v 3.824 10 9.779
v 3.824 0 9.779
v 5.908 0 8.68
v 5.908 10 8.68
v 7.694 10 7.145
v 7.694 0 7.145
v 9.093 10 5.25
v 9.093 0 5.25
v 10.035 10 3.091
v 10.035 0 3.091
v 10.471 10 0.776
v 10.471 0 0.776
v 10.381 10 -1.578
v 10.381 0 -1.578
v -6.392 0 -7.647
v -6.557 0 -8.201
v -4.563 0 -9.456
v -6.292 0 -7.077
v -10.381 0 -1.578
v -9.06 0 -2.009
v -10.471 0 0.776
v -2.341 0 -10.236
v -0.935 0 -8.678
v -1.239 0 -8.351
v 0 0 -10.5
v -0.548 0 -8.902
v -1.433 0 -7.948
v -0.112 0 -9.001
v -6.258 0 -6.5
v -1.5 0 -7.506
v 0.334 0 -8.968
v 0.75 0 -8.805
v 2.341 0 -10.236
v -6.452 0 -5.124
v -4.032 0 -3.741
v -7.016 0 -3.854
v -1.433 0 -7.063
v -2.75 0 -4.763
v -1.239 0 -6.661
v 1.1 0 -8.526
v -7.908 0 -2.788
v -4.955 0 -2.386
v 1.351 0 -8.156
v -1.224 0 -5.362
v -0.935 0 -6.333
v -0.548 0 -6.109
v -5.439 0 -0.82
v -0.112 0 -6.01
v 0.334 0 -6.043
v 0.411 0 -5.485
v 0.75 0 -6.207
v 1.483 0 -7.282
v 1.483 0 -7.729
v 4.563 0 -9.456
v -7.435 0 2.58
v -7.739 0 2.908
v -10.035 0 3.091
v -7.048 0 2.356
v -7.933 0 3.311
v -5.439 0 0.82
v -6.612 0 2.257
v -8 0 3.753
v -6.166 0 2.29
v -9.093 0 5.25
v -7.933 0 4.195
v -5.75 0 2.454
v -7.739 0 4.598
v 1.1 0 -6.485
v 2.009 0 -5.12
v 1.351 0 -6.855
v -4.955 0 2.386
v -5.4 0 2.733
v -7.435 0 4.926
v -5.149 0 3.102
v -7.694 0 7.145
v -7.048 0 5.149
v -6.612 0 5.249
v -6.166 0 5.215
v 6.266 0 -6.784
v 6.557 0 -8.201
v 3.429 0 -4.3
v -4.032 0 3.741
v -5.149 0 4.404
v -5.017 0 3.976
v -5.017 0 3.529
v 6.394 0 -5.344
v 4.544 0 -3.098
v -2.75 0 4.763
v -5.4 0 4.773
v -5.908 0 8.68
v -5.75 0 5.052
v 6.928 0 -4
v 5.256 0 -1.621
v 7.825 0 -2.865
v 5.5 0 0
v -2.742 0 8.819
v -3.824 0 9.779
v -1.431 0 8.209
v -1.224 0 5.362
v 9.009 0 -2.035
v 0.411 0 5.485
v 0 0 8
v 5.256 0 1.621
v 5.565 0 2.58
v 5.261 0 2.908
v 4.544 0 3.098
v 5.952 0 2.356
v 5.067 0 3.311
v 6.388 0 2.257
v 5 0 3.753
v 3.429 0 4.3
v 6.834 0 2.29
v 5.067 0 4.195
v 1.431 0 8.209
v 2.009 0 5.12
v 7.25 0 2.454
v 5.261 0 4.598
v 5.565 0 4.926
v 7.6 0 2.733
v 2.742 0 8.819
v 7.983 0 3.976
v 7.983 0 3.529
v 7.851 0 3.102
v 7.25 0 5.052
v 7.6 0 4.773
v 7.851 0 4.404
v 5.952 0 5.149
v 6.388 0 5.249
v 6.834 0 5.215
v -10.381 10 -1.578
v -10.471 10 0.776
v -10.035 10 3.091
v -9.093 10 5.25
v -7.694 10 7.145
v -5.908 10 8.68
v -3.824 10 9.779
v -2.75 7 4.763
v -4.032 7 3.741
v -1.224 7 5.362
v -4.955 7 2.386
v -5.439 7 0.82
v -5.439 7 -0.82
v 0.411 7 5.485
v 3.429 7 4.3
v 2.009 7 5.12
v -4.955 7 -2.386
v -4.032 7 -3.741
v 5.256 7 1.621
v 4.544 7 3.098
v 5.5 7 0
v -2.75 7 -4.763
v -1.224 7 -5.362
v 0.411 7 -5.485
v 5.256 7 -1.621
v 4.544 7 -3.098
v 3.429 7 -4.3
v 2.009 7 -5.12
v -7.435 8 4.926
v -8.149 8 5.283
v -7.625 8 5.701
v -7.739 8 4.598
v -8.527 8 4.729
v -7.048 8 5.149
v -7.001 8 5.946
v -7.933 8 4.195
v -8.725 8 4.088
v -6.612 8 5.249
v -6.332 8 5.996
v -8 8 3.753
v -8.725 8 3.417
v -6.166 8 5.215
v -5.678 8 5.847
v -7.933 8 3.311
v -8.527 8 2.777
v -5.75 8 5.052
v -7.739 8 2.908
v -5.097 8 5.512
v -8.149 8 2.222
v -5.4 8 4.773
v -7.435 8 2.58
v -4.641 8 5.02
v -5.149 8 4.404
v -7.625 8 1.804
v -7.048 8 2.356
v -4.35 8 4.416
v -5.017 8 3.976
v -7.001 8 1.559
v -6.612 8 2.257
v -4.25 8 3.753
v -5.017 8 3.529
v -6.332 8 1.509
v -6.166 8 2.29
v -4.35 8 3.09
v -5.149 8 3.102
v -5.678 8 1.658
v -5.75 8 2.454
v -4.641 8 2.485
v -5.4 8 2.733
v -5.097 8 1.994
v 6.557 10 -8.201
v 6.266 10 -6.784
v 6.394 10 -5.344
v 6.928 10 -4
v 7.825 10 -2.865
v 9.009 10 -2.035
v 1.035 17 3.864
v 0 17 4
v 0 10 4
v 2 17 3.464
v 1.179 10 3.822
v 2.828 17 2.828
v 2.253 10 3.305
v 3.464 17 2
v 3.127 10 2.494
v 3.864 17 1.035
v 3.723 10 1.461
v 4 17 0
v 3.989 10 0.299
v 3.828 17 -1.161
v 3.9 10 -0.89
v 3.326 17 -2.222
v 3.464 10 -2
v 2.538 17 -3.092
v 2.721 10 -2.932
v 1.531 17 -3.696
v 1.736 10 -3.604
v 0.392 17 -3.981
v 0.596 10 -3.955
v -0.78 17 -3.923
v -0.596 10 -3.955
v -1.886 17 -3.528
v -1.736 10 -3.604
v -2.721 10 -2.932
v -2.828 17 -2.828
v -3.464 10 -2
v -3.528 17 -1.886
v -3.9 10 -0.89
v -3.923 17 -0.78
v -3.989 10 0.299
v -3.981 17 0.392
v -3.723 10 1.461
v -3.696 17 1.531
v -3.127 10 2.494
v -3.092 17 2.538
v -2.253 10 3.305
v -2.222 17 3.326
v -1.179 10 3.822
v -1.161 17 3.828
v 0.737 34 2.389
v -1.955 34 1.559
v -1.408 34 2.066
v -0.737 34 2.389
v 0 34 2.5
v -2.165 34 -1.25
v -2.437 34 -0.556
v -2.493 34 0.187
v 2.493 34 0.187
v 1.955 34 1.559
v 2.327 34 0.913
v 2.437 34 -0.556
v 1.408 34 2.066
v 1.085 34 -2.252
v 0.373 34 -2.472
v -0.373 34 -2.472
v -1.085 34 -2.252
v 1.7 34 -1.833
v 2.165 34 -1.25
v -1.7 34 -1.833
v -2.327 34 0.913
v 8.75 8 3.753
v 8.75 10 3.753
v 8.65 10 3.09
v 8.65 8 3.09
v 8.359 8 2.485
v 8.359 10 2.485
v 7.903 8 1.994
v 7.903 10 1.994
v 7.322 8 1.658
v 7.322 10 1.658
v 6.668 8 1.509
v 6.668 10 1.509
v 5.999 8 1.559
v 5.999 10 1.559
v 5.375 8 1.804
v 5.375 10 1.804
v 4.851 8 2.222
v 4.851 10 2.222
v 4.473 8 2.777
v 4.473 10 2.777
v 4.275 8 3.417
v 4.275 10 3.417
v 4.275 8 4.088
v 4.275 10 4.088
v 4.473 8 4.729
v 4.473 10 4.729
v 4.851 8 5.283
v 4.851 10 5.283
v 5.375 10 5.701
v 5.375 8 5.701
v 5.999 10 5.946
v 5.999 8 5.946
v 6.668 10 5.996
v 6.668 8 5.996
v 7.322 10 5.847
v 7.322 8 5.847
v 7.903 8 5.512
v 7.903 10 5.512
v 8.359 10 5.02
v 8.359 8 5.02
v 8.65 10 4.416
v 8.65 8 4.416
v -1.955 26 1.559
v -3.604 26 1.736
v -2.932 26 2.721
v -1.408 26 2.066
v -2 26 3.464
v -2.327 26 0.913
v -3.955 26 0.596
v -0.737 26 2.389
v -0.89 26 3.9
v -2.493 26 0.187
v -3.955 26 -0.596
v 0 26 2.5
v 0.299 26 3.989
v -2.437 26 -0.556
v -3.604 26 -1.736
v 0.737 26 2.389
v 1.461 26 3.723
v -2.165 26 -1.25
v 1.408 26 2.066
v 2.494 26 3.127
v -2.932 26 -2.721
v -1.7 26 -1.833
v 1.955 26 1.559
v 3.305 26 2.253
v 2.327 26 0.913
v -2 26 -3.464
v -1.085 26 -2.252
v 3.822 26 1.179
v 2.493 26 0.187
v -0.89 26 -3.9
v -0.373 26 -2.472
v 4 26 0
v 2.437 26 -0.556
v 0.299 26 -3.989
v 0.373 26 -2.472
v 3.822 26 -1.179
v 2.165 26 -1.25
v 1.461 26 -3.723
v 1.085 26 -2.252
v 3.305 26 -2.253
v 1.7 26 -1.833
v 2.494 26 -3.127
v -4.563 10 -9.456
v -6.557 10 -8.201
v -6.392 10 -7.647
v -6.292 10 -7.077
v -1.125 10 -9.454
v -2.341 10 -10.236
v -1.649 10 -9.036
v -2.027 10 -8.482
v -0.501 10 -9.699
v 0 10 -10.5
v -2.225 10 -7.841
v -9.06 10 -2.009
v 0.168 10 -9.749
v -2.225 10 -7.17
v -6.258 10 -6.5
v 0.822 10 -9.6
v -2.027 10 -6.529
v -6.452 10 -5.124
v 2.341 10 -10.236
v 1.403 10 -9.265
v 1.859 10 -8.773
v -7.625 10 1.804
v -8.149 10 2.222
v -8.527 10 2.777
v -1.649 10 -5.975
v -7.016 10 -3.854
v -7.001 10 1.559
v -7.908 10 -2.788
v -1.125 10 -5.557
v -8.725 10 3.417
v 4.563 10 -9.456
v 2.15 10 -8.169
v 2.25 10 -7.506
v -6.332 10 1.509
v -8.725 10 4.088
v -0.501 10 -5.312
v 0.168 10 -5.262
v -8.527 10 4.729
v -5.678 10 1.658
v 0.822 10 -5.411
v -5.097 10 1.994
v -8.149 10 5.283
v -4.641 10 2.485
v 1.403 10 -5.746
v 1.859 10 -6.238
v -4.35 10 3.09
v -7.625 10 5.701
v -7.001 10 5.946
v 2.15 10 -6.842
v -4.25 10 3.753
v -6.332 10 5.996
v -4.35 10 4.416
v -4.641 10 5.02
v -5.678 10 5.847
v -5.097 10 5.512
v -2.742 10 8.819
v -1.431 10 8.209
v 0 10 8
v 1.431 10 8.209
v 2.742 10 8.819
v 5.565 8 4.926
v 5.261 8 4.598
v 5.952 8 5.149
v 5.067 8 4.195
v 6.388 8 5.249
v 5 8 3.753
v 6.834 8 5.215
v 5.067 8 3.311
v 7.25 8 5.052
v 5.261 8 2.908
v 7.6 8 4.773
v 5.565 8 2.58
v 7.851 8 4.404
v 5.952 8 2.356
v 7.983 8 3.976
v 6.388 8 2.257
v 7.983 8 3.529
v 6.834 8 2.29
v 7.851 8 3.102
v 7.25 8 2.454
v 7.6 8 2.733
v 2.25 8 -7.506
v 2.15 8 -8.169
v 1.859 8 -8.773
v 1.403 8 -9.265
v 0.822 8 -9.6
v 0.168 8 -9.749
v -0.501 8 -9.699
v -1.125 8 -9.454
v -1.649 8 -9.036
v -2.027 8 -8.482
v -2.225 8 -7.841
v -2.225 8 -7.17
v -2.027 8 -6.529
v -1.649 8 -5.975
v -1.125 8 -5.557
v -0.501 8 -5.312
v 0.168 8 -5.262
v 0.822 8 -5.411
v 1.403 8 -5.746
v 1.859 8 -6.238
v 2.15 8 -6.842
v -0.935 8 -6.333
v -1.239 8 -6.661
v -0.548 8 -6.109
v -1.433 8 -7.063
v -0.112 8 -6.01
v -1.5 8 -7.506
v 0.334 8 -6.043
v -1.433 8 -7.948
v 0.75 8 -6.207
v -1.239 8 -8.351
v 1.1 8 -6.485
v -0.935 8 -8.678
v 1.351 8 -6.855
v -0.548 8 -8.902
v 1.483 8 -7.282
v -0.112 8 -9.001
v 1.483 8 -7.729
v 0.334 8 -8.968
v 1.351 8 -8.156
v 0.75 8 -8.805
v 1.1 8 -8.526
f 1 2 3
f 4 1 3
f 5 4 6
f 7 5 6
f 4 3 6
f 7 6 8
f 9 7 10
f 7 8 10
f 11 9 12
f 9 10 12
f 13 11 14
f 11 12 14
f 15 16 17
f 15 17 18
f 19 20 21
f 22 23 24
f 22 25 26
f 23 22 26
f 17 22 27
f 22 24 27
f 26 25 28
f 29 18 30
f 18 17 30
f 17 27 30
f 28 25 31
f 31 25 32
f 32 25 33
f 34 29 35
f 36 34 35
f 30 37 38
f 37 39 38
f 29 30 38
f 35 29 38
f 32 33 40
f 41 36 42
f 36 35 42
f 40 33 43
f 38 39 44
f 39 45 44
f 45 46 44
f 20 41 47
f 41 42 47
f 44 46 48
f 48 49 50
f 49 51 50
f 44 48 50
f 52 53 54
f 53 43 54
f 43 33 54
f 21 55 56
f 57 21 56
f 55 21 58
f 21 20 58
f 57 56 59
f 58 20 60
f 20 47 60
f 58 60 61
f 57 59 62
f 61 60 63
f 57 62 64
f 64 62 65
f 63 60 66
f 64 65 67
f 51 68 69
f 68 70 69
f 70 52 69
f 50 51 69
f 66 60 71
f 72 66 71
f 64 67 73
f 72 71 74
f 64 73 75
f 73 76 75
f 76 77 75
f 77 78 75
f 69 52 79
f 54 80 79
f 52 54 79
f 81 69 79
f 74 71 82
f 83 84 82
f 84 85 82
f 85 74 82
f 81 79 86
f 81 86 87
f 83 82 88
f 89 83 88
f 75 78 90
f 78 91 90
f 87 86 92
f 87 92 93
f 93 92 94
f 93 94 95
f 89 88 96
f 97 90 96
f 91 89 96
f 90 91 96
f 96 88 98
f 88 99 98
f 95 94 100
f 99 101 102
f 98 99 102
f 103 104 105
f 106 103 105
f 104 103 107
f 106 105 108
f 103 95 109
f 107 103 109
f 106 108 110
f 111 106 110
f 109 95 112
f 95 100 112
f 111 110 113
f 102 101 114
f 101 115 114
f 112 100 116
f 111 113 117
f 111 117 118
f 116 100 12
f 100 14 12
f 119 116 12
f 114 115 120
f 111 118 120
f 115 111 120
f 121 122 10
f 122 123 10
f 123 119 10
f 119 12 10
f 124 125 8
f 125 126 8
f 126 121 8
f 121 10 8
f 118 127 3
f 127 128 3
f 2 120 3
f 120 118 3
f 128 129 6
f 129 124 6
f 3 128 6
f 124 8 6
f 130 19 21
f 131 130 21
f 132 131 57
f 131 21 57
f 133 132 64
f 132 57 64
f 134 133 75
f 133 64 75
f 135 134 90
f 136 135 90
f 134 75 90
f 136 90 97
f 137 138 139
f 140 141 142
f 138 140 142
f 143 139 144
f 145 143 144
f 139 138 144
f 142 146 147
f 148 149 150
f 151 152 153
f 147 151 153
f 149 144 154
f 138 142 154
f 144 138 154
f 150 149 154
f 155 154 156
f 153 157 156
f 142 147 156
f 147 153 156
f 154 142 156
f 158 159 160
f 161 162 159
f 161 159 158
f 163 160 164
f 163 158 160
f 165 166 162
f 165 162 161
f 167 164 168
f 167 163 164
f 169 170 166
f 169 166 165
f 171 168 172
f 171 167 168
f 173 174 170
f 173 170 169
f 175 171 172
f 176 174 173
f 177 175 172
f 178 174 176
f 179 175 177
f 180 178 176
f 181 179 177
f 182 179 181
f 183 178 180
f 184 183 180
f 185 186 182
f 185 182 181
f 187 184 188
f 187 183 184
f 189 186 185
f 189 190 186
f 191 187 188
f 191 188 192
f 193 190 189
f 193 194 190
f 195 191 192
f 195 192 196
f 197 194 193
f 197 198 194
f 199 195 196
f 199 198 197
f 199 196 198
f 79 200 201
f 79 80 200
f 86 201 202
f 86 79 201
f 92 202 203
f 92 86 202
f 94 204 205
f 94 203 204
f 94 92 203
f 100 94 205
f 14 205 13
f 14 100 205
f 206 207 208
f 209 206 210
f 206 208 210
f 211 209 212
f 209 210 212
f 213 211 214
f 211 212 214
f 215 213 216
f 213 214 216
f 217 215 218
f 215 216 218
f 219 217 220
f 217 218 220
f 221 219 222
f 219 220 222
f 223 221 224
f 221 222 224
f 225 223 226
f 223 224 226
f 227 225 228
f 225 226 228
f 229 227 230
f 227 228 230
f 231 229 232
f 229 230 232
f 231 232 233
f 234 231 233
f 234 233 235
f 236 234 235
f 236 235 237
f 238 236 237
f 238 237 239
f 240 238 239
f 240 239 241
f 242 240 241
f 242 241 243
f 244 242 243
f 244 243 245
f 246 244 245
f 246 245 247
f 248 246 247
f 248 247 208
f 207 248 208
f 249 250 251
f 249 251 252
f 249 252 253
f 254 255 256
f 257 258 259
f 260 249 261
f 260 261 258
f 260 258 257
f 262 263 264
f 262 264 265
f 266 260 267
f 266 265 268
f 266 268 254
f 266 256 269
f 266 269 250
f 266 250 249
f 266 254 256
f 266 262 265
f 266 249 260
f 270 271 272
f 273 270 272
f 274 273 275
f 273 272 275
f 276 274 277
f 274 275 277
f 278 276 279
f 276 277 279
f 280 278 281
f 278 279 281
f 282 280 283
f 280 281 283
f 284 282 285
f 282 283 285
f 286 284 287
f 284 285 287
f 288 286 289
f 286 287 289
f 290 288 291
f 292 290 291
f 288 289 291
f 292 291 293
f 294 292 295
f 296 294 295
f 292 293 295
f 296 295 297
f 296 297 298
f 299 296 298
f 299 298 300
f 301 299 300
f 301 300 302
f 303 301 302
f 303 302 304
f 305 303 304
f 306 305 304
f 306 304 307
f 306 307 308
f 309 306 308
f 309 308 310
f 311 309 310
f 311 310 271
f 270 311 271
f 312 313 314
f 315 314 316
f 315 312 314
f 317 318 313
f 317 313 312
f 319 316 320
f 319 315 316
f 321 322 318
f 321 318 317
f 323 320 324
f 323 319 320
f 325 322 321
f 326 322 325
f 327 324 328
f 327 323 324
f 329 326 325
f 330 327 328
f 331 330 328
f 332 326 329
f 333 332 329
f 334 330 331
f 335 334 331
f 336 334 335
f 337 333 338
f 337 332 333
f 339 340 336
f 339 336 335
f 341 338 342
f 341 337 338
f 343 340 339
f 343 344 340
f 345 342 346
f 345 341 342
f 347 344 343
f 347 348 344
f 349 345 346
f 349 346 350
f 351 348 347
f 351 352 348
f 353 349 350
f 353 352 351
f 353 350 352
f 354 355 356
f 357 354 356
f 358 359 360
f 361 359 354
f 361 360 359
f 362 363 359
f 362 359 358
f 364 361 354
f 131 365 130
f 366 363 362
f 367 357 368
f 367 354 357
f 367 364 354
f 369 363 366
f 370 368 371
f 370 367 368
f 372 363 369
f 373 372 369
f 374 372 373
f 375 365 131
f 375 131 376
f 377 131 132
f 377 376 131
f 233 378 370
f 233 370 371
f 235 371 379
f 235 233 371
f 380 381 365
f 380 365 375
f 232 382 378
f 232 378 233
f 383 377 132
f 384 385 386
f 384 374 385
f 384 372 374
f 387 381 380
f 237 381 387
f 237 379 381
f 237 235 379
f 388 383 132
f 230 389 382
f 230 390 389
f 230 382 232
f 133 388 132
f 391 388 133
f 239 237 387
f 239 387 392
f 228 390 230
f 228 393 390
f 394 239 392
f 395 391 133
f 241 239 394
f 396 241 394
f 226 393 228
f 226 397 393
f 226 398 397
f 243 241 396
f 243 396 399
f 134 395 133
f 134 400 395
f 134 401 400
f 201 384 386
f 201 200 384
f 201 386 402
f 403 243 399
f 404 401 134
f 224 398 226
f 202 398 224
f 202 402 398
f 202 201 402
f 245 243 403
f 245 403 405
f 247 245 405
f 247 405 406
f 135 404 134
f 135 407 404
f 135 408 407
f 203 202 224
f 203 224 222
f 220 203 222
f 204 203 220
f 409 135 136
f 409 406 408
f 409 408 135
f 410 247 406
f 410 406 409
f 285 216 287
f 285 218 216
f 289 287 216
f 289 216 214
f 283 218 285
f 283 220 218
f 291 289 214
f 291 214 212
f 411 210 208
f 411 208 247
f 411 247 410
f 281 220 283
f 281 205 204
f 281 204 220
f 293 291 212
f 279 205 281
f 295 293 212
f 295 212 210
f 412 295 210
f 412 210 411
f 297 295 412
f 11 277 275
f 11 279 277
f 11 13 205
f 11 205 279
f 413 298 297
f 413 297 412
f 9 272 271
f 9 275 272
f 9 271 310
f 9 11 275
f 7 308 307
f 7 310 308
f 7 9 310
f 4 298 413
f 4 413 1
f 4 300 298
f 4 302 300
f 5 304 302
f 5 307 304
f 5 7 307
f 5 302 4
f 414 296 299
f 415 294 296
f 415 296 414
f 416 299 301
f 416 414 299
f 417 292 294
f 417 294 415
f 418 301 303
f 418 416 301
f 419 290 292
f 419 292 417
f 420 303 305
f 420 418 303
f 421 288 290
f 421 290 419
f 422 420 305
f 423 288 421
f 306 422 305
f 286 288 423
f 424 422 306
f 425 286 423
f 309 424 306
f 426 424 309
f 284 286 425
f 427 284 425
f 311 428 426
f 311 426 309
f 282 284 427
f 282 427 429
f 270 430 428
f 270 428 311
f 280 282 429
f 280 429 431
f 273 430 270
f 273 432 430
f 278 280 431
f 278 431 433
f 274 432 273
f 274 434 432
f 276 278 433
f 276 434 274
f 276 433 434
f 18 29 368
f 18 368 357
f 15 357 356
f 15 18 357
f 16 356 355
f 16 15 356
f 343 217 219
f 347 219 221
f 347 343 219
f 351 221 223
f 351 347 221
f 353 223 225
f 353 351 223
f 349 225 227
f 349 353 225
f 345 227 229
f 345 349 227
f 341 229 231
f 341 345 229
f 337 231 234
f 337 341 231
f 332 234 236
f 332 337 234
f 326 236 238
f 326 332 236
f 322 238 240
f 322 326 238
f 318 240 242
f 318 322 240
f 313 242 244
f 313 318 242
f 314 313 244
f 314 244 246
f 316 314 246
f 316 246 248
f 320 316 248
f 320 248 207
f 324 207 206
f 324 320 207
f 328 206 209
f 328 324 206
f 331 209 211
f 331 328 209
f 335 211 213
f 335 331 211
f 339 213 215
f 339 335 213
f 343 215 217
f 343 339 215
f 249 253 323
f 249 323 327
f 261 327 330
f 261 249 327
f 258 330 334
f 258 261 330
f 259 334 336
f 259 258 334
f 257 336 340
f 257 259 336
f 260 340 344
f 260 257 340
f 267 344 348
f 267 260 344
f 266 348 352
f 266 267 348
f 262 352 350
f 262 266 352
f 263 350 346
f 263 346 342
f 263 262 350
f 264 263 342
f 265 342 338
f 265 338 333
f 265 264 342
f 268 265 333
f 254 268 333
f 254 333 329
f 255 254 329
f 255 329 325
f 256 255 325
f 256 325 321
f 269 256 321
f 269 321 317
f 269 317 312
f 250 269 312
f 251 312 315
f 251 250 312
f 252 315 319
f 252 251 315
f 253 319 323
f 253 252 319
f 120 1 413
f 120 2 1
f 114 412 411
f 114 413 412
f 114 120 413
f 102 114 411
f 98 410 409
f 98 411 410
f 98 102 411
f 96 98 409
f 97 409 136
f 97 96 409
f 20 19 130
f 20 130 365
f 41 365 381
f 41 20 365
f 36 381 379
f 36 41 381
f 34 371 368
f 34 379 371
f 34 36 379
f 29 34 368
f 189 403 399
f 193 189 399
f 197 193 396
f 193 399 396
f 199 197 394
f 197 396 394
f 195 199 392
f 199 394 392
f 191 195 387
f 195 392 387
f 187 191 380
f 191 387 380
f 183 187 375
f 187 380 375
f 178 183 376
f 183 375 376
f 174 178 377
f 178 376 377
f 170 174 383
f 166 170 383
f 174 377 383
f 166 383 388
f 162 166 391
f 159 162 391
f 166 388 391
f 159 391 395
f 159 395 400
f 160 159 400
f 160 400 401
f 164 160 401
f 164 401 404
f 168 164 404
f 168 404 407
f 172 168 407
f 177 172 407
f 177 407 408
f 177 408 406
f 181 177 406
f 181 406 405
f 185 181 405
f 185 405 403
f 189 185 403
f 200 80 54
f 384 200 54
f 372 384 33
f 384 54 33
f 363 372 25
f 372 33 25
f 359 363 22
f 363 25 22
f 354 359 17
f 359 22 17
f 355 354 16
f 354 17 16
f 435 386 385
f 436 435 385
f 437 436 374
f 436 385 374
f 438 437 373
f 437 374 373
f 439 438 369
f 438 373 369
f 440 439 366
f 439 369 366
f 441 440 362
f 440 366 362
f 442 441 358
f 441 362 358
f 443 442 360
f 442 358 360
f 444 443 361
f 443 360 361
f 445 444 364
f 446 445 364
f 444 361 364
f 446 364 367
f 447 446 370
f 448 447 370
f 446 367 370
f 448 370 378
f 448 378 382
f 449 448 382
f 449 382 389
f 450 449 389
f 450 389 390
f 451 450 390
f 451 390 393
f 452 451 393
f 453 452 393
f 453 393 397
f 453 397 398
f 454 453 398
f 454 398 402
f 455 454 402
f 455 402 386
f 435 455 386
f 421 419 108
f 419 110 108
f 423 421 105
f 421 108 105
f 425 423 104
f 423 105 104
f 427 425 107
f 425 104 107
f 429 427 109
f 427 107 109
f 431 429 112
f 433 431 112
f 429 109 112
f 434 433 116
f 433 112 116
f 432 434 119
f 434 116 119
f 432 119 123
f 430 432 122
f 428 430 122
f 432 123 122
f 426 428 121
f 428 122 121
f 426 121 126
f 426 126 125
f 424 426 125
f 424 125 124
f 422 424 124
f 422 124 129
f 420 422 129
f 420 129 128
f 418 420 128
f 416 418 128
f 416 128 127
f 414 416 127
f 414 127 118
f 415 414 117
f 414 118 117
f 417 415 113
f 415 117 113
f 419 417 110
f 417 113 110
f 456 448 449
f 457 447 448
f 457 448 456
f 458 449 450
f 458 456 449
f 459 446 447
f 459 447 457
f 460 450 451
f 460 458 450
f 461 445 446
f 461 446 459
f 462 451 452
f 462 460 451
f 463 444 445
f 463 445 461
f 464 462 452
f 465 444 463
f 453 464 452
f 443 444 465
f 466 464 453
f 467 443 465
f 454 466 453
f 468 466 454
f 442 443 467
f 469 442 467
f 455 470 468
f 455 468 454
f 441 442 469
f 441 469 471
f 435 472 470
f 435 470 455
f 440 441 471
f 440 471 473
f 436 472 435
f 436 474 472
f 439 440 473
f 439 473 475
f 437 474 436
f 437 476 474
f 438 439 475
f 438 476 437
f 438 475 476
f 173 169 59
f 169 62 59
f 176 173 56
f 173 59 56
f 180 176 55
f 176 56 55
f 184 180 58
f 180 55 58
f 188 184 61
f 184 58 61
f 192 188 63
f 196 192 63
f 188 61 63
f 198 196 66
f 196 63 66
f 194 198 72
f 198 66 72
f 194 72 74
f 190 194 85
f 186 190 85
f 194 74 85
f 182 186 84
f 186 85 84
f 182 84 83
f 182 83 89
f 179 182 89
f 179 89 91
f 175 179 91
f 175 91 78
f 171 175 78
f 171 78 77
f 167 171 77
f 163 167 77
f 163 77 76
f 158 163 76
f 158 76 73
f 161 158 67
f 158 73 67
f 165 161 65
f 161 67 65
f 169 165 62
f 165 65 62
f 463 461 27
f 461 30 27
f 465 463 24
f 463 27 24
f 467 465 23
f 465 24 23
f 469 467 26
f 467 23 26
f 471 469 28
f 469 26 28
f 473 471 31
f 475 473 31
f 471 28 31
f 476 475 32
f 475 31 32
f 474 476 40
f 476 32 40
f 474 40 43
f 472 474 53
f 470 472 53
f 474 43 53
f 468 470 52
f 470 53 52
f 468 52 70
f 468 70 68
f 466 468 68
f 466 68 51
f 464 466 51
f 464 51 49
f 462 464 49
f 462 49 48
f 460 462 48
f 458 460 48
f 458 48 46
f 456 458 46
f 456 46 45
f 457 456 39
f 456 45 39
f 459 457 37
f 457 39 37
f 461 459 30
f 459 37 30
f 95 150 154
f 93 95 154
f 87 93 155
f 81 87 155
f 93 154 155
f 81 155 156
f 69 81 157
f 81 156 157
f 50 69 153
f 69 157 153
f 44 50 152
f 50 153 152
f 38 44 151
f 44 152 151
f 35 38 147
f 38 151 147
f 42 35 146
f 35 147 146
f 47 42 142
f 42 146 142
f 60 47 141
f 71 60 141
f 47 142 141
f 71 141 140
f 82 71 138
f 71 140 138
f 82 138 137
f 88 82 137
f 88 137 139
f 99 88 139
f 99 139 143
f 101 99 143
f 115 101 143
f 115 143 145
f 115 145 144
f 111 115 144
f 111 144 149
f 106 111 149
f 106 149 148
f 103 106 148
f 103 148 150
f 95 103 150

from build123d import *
from build123d.topology import SkipClean

# Parameters (mm, degrees)
SKETCH1_R               = 10.5
SKETCH1_R_2             = 4
BOSS_EXTRUDE1_DEPTH     = 10
SKETCH1_3_R             = 4
BOSS_EXTRUDE2_DEPTH     = 17
CUT_EXTRUDE3_DEPTH      = 38.101212918
CUT_EXTRUDE3_DEPTH_BACK = 38.101212918
SKETCH4_R               = 5
HOLE1_D                 = 3
HOLE1_DEPTH             = 10
HOLE1_CBORE_D           = 4.5
HOLE1_CBORE_DEPTH       = 2
HOLE1_TIP               = 0.901290929
HOLE2_D                 = 11
HOLE2_DEPTH             = 7
SKETCH10_R              = 8.667878953
SKETCH10_R_2            = 2.5
CUT_EXTRUDE4_DEPTH      = 8


# Read off the part's stored shape, not the designer's step: M8x1.25 Machine Threads Stud1
with BuildPart() as part:
    # Sketch1 → Boss-Extrude1 (new body)
    # profile 1 of 2: a face of its own
    with BuildSketch(Plane(origin=(0, 0, 0), x_dir=(1, 0, 0), z_dir=(0, 1, 0))):
        with Locations(Location((0, 0, 0), (0, 0, 270))):
            Circle(SKETCH1_R)
        Circle(SKETCH1_R_2, mode=Mode.SUBTRACT)
    # profile 2 of 2: a face of its own
    with BuildSketch(Plane(origin=(0, 0, 0), x_dir=(1, 0, 0), z_dir=(0, 1, 0))):
        Circle(SKETCH1_R_2)
    extrude(amount=BOSS_EXTRUDE1_DEPTH)

    # Sketch1<3> → Boss-Extrude2 (add)
    with BuildSketch(Plane(origin=(0, 0, 0), x_dir=(1, 0, 0), z_dir=(0, 1, 0))):
        with Locations(Location((0, 0, 0), (0, 0, 270))):
            Circle(SKETCH1_3_R)
    extrude(amount=BOSS_EXTRUDE2_DEPTH)

    # M8x1.25 Machine Threads Stud1 outline → M8x1.25 Machine Threads Stud1 (revolve)
    with SkipClean():  # the faces are left unmerged after this step: merging them gives an invalid solid
        with BuildSketch(Plane.XY):
            Polygon((4, 17), (4, 33.3095), (3.3095, 34), (0, 34), (0, 17), align=None)
        revolve(axis=Axis((0, 0, 0), (0, 1, 0)))

    # Sketch4 → Cut-Extrude3 (cut, two sides: drawn at the far end of the back side and taken through both)
    with SkipClean():  # the faces are left unmerged after this step: merging them gives an invalid solid
        with BuildSketch(Plane(origin=(0, 0, 0), x_dir=(1, 0, 0), z_dir=(0, 1, 0)).offset(-CUT_EXTRUDE3_DEPTH_BACK)):
            with Locations((0, -13)):
                Circle(SKETCH4_R)
            with Locations((-11.258330249, 6.5)):
                Circle(SKETCH4_R)
            with Locations((11.258330249, 6.5)):
                Circle(SKETCH4_R)
        extrude(amount=CUT_EXTRUDE3_DEPTH + CUT_EXTRUDE3_DEPTH_BACK, mode=Mode.SUBTRACT)

    # Hole1
    with Locations(Plane(origin=(0, 10, 0), x_dir=(1, 0, 0), z_dir=(0, 1, 0))):
        with Locations((0, 7.505553499), (6.5, -3.75277675), (-6.5, -3.75277675)):
            CounterBoreHole(HOLE1_D / 2, HOLE1_CBORE_D / 2, HOLE1_CBORE_DEPTH, depth=HOLE1_DEPTH)
            with Locations((0, 0, -(HOLE1_DEPTH + HOLE1_TIP / 2))):  # 118° drill point
                Cone(0, HOLE1_D / 2, HOLE1_TIP, mode=Mode.SUBTRACT)

    # Hole2
    with Locations(Plane(origin=(0, 0, 0), x_dir=(-1, 0, 0), z_dir=(0, -1, 0))):
        with Locations((0, 0)):
            Hole(HOLE2_D / 2, depth=HOLE2_DEPTH)

    # Sketch10 → Cut-Extrude4 (cut)
    with SkipClean():  # the faces are left unmerged after this step: merging them gives an invalid solid
        with BuildSketch(Plane(origin=(0, 34, 0), x_dir=(1, 0, 0), z_dir=(0, 1, 0))):
            Circle(SKETCH10_R)
            with Locations(Location((0, 0, 0), (0, 0, 270))):
                Circle(SKETCH10_R_2, mode=Mode.SUBTRACT)
        extrude(amount=-CUT_EXTRUDE4_DEPTH, mode=Mode.SUBTRACT)
    add(part.part.scale(1), mode=Mode.REPLACE)  # the faces are merged on a copy


solid = part.part
